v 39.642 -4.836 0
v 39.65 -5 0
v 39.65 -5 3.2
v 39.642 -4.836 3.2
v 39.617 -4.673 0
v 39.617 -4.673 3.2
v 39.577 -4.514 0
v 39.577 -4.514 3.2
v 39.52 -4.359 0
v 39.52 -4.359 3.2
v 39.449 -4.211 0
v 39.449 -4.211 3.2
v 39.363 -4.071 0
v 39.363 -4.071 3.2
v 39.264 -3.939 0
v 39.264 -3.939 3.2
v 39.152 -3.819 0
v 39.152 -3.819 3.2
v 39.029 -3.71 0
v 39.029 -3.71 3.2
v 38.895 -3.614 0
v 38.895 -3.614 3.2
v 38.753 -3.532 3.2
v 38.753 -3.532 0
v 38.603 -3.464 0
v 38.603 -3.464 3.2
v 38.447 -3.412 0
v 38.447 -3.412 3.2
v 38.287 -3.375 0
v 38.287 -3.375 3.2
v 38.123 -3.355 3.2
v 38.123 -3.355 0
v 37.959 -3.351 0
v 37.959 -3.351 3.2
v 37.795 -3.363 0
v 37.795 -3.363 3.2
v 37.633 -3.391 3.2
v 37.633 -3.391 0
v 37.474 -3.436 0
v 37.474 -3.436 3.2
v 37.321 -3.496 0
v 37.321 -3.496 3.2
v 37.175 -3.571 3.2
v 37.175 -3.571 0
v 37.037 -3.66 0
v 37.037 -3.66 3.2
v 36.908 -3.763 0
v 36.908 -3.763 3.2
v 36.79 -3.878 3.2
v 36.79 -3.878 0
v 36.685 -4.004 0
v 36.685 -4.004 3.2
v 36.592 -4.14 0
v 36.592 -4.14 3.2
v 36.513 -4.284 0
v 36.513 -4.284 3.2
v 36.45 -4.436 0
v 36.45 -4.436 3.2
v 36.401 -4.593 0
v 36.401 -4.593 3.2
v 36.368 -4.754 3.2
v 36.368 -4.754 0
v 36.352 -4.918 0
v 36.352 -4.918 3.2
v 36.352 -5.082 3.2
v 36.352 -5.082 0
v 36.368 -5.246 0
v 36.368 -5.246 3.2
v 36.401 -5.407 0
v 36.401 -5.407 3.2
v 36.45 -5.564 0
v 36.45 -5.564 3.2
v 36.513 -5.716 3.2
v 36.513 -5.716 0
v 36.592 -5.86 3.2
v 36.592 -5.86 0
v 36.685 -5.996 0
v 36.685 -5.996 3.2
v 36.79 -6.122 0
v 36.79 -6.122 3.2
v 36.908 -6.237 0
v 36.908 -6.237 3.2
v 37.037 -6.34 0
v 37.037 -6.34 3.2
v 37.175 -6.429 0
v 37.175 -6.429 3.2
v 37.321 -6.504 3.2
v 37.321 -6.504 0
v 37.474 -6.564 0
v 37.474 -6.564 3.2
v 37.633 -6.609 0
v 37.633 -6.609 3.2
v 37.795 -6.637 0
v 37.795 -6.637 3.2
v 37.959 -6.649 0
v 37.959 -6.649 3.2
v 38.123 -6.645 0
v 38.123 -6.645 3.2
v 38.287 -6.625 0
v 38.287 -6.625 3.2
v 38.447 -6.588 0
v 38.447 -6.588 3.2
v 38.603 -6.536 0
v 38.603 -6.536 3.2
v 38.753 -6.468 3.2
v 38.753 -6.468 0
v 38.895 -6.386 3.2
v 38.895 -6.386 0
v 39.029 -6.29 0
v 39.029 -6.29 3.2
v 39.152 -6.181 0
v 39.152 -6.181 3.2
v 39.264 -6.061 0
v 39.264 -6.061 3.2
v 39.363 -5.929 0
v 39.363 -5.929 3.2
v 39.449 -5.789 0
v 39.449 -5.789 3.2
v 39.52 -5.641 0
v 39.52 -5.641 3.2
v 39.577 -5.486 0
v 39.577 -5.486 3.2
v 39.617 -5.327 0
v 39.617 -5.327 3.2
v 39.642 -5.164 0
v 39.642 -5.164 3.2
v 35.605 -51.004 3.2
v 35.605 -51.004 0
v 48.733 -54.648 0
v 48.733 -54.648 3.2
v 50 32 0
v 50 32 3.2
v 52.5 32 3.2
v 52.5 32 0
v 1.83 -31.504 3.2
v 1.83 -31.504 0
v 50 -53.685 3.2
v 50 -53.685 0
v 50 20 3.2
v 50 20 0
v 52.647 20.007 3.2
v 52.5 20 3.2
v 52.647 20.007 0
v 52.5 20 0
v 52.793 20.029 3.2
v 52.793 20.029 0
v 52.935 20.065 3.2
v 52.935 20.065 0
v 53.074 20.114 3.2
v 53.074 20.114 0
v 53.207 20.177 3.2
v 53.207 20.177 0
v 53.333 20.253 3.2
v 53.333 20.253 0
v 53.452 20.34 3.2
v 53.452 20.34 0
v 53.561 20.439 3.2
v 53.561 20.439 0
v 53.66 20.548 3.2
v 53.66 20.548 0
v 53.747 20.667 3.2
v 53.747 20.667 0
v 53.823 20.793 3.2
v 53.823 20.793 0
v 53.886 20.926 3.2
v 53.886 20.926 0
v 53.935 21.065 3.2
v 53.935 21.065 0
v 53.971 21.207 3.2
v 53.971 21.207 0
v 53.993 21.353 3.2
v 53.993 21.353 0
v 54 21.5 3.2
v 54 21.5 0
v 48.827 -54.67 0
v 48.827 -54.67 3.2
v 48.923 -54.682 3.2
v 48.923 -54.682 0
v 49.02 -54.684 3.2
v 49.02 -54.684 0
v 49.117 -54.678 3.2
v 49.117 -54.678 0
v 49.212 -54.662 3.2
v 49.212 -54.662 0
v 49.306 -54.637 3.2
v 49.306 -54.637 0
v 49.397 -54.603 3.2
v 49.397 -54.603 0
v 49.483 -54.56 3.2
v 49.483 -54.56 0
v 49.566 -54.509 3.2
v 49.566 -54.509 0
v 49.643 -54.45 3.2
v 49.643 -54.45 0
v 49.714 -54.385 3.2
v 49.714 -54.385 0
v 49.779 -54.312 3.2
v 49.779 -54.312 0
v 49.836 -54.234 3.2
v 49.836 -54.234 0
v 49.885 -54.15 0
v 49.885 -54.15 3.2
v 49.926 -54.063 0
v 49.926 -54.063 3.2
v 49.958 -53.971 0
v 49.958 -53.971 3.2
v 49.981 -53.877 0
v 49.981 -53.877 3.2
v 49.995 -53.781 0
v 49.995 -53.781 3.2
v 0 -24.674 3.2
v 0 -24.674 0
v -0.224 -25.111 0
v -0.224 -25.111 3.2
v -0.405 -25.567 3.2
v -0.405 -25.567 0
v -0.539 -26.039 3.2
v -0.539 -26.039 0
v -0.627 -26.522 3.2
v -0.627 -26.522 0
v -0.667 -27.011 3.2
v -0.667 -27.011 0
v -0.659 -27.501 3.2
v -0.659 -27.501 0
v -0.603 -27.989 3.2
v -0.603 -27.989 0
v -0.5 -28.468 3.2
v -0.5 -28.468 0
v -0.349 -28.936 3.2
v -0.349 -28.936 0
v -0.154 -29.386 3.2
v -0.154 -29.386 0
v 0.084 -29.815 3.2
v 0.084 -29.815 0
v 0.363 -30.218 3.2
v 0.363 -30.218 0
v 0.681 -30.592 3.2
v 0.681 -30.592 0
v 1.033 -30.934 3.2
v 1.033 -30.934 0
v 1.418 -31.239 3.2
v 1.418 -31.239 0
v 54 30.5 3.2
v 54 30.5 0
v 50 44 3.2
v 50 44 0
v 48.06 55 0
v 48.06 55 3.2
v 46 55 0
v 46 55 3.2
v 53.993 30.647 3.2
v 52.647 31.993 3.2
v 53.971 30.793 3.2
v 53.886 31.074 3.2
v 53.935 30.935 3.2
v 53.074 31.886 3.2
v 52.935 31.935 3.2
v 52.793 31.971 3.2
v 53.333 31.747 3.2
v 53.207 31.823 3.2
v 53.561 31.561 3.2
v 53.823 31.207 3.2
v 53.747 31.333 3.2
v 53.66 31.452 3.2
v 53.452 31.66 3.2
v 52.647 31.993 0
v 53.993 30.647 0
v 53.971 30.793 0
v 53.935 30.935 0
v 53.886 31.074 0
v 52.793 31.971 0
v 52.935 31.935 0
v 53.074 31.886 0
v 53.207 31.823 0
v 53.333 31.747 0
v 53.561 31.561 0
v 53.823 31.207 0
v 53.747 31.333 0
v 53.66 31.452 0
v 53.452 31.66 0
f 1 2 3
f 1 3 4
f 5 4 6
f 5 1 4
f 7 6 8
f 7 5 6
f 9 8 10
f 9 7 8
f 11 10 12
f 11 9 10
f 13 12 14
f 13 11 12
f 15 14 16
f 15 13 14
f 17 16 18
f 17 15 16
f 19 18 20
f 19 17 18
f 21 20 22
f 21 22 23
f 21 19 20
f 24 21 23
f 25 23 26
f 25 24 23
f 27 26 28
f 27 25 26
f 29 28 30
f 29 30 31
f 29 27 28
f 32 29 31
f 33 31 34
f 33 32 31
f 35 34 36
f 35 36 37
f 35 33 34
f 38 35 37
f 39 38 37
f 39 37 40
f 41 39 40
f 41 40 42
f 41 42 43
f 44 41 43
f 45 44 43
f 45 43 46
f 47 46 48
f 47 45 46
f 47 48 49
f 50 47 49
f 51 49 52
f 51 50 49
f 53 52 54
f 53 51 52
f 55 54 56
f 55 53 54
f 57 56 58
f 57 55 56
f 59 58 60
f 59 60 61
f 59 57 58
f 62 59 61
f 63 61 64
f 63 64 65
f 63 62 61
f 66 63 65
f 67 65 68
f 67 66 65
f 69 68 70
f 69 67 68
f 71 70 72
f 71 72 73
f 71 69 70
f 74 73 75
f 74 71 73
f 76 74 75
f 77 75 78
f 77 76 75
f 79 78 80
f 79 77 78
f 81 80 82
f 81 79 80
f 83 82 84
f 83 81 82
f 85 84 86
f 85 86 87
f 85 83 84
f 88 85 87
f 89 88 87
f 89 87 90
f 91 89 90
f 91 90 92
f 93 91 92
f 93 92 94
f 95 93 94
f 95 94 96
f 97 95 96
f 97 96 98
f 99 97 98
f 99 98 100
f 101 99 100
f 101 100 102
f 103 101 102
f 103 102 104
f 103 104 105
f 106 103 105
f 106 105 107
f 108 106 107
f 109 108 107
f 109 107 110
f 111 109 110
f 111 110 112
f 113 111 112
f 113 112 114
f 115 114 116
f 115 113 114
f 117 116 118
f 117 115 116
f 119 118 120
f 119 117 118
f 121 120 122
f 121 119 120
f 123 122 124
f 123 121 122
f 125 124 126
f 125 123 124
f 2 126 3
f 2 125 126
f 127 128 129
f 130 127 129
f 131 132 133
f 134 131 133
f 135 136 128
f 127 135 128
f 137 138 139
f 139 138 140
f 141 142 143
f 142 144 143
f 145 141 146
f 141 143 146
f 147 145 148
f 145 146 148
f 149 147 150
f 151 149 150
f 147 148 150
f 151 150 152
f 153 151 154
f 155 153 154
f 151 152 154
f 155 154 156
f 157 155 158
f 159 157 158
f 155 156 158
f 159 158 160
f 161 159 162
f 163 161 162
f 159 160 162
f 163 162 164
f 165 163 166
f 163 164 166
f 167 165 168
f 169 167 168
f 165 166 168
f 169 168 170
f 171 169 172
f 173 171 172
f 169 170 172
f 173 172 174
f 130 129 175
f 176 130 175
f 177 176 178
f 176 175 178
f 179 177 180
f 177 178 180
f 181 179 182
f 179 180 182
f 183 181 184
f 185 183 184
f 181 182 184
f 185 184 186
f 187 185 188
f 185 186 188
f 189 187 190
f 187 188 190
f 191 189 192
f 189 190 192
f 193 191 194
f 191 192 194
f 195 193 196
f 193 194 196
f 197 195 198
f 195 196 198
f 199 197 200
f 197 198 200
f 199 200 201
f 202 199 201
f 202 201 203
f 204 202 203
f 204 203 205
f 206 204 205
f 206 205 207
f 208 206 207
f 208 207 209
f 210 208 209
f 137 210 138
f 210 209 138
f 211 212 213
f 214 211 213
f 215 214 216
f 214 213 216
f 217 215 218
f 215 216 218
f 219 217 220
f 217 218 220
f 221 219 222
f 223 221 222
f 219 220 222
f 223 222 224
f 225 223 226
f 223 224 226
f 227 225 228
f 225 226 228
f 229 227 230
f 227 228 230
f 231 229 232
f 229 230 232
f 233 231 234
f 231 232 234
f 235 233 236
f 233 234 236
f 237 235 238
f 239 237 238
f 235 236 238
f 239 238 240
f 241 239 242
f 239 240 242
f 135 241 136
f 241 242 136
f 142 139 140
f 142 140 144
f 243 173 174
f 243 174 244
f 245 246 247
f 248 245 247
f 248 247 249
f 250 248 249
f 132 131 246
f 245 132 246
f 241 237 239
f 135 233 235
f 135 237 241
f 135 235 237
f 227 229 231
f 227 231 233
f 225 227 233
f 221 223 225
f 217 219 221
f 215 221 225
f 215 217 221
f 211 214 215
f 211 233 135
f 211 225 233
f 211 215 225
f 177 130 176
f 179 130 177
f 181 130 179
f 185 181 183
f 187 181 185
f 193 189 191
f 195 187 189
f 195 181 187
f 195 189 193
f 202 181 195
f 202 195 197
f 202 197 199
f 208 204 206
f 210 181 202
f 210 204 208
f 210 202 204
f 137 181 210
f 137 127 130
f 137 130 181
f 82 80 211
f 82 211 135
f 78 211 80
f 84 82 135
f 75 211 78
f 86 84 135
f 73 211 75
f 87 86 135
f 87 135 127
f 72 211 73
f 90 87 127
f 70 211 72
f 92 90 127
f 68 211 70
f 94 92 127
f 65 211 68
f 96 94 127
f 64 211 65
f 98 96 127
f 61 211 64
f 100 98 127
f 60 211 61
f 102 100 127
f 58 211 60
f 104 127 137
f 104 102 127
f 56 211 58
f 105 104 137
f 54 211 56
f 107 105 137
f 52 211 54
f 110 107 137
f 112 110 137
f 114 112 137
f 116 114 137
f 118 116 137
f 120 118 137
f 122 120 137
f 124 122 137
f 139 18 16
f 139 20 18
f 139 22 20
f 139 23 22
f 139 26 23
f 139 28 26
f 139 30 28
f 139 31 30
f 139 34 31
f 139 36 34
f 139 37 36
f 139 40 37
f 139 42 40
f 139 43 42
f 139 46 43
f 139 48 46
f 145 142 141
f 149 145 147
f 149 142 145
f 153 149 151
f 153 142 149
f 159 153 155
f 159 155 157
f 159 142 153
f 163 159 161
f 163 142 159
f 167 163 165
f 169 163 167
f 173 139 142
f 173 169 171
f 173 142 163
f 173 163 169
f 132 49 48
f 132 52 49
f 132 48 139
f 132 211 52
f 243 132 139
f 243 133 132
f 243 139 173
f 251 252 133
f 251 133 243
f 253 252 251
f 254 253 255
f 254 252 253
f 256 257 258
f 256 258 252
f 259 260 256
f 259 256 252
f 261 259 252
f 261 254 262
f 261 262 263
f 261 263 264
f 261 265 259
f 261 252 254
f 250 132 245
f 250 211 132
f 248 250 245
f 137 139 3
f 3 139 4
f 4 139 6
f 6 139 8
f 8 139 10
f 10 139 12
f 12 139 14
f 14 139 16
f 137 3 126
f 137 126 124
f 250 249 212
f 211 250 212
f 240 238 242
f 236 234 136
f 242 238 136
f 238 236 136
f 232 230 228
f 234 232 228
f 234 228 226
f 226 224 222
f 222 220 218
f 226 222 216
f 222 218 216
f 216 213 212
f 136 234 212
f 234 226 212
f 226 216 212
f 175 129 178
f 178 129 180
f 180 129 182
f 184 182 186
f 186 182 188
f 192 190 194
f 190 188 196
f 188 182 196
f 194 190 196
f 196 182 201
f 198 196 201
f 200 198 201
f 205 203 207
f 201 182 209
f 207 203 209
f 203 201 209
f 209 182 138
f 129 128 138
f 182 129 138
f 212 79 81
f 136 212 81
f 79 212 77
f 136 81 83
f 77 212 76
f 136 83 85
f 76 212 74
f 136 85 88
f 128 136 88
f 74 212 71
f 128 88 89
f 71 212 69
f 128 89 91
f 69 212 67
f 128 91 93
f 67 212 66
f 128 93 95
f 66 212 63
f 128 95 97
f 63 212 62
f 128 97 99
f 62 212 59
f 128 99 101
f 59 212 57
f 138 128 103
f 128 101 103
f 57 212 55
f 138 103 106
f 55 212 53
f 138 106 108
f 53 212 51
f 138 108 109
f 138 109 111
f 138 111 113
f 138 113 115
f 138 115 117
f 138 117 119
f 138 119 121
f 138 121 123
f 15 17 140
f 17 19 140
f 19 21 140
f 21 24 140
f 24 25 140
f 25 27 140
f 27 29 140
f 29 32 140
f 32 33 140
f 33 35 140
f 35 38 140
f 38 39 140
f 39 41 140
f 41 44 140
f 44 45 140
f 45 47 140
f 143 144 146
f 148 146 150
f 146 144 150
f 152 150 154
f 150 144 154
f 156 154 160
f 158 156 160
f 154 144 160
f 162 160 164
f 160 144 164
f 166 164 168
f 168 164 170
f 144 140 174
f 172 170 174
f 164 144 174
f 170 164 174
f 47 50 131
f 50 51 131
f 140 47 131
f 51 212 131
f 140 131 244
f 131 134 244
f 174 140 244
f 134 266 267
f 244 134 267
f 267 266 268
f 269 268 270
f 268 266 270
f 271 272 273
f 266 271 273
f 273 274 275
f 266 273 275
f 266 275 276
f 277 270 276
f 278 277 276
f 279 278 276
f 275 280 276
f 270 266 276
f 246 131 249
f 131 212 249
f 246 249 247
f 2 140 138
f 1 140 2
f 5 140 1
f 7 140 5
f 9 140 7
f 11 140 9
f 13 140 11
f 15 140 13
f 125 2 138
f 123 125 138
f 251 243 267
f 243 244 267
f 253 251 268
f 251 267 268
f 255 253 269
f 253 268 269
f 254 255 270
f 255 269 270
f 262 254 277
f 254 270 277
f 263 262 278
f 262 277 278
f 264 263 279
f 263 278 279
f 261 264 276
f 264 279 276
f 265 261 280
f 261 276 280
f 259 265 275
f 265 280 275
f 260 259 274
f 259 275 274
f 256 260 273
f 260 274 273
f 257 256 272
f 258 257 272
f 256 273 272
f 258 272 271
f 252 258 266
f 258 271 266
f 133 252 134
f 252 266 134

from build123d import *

# Parameters (mm, degrees)
SKETCH1_R           = 1.65
BOSS_EXTRUDE1_DEPTH = 3.2
SKETCH2_W           = 4
SKETCH2_H           = 12
BOSS_EXTRUDE2_DEPTH = 3.2
FILLET1_R           = 1.5


with BuildPart() as part:
    # Sketch1 → Boss-Extrude1 (new body)
    with BuildSketch(Plane.XY):
        with BuildLine():
            Line((1.830127019, -31.504464167), (35.605117766, -51.004464167))
            Line((35.605117766, -51.004464167), (48.732545217, -54.648197122))
            ThreePointArc((48.732545217, -54.648197122), (49.6052046, -54.480696676), (50, -53.68462671))
            Line((50, -53.68462671), (50, 44))
            Line((50, 44), (48.060403212, 55))
            Line((48.060403212, 55), (46, 55))
            Line((46, 55), (0, -24.674337148))
            ThreePointArc((0, -24.674337148), (-0.499502113, -28.468432374), (1.830127019, -31.504464167))
        make_face()
        with Locations((38, -5)):
            Circle(SKETCH1_R, mode=Mode.SUBTRACT)
    extrude(amount=BOSS_EXTRUDE1_DEPTH)

    # Sketch2 → Boss-Extrude2 (add)
    with BuildSketch(Plane.XY.offset(3.2)):
        with Locations((52, 26)):
            Rectangle(SKETCH2_W, SKETCH2_H)
    extrude(amount=-BOSS_EXTRUDE2_DEPTH)

    # Fillet1
    fillet1_edges = [part.edges().sort_by_distance(p)[0] for p in [
        (54, 32, 1.6),
        (54, 20, 1.6),
    ]]
    fillet(fillet1_edges, radius=FILLET1_R)


solid = part.part
